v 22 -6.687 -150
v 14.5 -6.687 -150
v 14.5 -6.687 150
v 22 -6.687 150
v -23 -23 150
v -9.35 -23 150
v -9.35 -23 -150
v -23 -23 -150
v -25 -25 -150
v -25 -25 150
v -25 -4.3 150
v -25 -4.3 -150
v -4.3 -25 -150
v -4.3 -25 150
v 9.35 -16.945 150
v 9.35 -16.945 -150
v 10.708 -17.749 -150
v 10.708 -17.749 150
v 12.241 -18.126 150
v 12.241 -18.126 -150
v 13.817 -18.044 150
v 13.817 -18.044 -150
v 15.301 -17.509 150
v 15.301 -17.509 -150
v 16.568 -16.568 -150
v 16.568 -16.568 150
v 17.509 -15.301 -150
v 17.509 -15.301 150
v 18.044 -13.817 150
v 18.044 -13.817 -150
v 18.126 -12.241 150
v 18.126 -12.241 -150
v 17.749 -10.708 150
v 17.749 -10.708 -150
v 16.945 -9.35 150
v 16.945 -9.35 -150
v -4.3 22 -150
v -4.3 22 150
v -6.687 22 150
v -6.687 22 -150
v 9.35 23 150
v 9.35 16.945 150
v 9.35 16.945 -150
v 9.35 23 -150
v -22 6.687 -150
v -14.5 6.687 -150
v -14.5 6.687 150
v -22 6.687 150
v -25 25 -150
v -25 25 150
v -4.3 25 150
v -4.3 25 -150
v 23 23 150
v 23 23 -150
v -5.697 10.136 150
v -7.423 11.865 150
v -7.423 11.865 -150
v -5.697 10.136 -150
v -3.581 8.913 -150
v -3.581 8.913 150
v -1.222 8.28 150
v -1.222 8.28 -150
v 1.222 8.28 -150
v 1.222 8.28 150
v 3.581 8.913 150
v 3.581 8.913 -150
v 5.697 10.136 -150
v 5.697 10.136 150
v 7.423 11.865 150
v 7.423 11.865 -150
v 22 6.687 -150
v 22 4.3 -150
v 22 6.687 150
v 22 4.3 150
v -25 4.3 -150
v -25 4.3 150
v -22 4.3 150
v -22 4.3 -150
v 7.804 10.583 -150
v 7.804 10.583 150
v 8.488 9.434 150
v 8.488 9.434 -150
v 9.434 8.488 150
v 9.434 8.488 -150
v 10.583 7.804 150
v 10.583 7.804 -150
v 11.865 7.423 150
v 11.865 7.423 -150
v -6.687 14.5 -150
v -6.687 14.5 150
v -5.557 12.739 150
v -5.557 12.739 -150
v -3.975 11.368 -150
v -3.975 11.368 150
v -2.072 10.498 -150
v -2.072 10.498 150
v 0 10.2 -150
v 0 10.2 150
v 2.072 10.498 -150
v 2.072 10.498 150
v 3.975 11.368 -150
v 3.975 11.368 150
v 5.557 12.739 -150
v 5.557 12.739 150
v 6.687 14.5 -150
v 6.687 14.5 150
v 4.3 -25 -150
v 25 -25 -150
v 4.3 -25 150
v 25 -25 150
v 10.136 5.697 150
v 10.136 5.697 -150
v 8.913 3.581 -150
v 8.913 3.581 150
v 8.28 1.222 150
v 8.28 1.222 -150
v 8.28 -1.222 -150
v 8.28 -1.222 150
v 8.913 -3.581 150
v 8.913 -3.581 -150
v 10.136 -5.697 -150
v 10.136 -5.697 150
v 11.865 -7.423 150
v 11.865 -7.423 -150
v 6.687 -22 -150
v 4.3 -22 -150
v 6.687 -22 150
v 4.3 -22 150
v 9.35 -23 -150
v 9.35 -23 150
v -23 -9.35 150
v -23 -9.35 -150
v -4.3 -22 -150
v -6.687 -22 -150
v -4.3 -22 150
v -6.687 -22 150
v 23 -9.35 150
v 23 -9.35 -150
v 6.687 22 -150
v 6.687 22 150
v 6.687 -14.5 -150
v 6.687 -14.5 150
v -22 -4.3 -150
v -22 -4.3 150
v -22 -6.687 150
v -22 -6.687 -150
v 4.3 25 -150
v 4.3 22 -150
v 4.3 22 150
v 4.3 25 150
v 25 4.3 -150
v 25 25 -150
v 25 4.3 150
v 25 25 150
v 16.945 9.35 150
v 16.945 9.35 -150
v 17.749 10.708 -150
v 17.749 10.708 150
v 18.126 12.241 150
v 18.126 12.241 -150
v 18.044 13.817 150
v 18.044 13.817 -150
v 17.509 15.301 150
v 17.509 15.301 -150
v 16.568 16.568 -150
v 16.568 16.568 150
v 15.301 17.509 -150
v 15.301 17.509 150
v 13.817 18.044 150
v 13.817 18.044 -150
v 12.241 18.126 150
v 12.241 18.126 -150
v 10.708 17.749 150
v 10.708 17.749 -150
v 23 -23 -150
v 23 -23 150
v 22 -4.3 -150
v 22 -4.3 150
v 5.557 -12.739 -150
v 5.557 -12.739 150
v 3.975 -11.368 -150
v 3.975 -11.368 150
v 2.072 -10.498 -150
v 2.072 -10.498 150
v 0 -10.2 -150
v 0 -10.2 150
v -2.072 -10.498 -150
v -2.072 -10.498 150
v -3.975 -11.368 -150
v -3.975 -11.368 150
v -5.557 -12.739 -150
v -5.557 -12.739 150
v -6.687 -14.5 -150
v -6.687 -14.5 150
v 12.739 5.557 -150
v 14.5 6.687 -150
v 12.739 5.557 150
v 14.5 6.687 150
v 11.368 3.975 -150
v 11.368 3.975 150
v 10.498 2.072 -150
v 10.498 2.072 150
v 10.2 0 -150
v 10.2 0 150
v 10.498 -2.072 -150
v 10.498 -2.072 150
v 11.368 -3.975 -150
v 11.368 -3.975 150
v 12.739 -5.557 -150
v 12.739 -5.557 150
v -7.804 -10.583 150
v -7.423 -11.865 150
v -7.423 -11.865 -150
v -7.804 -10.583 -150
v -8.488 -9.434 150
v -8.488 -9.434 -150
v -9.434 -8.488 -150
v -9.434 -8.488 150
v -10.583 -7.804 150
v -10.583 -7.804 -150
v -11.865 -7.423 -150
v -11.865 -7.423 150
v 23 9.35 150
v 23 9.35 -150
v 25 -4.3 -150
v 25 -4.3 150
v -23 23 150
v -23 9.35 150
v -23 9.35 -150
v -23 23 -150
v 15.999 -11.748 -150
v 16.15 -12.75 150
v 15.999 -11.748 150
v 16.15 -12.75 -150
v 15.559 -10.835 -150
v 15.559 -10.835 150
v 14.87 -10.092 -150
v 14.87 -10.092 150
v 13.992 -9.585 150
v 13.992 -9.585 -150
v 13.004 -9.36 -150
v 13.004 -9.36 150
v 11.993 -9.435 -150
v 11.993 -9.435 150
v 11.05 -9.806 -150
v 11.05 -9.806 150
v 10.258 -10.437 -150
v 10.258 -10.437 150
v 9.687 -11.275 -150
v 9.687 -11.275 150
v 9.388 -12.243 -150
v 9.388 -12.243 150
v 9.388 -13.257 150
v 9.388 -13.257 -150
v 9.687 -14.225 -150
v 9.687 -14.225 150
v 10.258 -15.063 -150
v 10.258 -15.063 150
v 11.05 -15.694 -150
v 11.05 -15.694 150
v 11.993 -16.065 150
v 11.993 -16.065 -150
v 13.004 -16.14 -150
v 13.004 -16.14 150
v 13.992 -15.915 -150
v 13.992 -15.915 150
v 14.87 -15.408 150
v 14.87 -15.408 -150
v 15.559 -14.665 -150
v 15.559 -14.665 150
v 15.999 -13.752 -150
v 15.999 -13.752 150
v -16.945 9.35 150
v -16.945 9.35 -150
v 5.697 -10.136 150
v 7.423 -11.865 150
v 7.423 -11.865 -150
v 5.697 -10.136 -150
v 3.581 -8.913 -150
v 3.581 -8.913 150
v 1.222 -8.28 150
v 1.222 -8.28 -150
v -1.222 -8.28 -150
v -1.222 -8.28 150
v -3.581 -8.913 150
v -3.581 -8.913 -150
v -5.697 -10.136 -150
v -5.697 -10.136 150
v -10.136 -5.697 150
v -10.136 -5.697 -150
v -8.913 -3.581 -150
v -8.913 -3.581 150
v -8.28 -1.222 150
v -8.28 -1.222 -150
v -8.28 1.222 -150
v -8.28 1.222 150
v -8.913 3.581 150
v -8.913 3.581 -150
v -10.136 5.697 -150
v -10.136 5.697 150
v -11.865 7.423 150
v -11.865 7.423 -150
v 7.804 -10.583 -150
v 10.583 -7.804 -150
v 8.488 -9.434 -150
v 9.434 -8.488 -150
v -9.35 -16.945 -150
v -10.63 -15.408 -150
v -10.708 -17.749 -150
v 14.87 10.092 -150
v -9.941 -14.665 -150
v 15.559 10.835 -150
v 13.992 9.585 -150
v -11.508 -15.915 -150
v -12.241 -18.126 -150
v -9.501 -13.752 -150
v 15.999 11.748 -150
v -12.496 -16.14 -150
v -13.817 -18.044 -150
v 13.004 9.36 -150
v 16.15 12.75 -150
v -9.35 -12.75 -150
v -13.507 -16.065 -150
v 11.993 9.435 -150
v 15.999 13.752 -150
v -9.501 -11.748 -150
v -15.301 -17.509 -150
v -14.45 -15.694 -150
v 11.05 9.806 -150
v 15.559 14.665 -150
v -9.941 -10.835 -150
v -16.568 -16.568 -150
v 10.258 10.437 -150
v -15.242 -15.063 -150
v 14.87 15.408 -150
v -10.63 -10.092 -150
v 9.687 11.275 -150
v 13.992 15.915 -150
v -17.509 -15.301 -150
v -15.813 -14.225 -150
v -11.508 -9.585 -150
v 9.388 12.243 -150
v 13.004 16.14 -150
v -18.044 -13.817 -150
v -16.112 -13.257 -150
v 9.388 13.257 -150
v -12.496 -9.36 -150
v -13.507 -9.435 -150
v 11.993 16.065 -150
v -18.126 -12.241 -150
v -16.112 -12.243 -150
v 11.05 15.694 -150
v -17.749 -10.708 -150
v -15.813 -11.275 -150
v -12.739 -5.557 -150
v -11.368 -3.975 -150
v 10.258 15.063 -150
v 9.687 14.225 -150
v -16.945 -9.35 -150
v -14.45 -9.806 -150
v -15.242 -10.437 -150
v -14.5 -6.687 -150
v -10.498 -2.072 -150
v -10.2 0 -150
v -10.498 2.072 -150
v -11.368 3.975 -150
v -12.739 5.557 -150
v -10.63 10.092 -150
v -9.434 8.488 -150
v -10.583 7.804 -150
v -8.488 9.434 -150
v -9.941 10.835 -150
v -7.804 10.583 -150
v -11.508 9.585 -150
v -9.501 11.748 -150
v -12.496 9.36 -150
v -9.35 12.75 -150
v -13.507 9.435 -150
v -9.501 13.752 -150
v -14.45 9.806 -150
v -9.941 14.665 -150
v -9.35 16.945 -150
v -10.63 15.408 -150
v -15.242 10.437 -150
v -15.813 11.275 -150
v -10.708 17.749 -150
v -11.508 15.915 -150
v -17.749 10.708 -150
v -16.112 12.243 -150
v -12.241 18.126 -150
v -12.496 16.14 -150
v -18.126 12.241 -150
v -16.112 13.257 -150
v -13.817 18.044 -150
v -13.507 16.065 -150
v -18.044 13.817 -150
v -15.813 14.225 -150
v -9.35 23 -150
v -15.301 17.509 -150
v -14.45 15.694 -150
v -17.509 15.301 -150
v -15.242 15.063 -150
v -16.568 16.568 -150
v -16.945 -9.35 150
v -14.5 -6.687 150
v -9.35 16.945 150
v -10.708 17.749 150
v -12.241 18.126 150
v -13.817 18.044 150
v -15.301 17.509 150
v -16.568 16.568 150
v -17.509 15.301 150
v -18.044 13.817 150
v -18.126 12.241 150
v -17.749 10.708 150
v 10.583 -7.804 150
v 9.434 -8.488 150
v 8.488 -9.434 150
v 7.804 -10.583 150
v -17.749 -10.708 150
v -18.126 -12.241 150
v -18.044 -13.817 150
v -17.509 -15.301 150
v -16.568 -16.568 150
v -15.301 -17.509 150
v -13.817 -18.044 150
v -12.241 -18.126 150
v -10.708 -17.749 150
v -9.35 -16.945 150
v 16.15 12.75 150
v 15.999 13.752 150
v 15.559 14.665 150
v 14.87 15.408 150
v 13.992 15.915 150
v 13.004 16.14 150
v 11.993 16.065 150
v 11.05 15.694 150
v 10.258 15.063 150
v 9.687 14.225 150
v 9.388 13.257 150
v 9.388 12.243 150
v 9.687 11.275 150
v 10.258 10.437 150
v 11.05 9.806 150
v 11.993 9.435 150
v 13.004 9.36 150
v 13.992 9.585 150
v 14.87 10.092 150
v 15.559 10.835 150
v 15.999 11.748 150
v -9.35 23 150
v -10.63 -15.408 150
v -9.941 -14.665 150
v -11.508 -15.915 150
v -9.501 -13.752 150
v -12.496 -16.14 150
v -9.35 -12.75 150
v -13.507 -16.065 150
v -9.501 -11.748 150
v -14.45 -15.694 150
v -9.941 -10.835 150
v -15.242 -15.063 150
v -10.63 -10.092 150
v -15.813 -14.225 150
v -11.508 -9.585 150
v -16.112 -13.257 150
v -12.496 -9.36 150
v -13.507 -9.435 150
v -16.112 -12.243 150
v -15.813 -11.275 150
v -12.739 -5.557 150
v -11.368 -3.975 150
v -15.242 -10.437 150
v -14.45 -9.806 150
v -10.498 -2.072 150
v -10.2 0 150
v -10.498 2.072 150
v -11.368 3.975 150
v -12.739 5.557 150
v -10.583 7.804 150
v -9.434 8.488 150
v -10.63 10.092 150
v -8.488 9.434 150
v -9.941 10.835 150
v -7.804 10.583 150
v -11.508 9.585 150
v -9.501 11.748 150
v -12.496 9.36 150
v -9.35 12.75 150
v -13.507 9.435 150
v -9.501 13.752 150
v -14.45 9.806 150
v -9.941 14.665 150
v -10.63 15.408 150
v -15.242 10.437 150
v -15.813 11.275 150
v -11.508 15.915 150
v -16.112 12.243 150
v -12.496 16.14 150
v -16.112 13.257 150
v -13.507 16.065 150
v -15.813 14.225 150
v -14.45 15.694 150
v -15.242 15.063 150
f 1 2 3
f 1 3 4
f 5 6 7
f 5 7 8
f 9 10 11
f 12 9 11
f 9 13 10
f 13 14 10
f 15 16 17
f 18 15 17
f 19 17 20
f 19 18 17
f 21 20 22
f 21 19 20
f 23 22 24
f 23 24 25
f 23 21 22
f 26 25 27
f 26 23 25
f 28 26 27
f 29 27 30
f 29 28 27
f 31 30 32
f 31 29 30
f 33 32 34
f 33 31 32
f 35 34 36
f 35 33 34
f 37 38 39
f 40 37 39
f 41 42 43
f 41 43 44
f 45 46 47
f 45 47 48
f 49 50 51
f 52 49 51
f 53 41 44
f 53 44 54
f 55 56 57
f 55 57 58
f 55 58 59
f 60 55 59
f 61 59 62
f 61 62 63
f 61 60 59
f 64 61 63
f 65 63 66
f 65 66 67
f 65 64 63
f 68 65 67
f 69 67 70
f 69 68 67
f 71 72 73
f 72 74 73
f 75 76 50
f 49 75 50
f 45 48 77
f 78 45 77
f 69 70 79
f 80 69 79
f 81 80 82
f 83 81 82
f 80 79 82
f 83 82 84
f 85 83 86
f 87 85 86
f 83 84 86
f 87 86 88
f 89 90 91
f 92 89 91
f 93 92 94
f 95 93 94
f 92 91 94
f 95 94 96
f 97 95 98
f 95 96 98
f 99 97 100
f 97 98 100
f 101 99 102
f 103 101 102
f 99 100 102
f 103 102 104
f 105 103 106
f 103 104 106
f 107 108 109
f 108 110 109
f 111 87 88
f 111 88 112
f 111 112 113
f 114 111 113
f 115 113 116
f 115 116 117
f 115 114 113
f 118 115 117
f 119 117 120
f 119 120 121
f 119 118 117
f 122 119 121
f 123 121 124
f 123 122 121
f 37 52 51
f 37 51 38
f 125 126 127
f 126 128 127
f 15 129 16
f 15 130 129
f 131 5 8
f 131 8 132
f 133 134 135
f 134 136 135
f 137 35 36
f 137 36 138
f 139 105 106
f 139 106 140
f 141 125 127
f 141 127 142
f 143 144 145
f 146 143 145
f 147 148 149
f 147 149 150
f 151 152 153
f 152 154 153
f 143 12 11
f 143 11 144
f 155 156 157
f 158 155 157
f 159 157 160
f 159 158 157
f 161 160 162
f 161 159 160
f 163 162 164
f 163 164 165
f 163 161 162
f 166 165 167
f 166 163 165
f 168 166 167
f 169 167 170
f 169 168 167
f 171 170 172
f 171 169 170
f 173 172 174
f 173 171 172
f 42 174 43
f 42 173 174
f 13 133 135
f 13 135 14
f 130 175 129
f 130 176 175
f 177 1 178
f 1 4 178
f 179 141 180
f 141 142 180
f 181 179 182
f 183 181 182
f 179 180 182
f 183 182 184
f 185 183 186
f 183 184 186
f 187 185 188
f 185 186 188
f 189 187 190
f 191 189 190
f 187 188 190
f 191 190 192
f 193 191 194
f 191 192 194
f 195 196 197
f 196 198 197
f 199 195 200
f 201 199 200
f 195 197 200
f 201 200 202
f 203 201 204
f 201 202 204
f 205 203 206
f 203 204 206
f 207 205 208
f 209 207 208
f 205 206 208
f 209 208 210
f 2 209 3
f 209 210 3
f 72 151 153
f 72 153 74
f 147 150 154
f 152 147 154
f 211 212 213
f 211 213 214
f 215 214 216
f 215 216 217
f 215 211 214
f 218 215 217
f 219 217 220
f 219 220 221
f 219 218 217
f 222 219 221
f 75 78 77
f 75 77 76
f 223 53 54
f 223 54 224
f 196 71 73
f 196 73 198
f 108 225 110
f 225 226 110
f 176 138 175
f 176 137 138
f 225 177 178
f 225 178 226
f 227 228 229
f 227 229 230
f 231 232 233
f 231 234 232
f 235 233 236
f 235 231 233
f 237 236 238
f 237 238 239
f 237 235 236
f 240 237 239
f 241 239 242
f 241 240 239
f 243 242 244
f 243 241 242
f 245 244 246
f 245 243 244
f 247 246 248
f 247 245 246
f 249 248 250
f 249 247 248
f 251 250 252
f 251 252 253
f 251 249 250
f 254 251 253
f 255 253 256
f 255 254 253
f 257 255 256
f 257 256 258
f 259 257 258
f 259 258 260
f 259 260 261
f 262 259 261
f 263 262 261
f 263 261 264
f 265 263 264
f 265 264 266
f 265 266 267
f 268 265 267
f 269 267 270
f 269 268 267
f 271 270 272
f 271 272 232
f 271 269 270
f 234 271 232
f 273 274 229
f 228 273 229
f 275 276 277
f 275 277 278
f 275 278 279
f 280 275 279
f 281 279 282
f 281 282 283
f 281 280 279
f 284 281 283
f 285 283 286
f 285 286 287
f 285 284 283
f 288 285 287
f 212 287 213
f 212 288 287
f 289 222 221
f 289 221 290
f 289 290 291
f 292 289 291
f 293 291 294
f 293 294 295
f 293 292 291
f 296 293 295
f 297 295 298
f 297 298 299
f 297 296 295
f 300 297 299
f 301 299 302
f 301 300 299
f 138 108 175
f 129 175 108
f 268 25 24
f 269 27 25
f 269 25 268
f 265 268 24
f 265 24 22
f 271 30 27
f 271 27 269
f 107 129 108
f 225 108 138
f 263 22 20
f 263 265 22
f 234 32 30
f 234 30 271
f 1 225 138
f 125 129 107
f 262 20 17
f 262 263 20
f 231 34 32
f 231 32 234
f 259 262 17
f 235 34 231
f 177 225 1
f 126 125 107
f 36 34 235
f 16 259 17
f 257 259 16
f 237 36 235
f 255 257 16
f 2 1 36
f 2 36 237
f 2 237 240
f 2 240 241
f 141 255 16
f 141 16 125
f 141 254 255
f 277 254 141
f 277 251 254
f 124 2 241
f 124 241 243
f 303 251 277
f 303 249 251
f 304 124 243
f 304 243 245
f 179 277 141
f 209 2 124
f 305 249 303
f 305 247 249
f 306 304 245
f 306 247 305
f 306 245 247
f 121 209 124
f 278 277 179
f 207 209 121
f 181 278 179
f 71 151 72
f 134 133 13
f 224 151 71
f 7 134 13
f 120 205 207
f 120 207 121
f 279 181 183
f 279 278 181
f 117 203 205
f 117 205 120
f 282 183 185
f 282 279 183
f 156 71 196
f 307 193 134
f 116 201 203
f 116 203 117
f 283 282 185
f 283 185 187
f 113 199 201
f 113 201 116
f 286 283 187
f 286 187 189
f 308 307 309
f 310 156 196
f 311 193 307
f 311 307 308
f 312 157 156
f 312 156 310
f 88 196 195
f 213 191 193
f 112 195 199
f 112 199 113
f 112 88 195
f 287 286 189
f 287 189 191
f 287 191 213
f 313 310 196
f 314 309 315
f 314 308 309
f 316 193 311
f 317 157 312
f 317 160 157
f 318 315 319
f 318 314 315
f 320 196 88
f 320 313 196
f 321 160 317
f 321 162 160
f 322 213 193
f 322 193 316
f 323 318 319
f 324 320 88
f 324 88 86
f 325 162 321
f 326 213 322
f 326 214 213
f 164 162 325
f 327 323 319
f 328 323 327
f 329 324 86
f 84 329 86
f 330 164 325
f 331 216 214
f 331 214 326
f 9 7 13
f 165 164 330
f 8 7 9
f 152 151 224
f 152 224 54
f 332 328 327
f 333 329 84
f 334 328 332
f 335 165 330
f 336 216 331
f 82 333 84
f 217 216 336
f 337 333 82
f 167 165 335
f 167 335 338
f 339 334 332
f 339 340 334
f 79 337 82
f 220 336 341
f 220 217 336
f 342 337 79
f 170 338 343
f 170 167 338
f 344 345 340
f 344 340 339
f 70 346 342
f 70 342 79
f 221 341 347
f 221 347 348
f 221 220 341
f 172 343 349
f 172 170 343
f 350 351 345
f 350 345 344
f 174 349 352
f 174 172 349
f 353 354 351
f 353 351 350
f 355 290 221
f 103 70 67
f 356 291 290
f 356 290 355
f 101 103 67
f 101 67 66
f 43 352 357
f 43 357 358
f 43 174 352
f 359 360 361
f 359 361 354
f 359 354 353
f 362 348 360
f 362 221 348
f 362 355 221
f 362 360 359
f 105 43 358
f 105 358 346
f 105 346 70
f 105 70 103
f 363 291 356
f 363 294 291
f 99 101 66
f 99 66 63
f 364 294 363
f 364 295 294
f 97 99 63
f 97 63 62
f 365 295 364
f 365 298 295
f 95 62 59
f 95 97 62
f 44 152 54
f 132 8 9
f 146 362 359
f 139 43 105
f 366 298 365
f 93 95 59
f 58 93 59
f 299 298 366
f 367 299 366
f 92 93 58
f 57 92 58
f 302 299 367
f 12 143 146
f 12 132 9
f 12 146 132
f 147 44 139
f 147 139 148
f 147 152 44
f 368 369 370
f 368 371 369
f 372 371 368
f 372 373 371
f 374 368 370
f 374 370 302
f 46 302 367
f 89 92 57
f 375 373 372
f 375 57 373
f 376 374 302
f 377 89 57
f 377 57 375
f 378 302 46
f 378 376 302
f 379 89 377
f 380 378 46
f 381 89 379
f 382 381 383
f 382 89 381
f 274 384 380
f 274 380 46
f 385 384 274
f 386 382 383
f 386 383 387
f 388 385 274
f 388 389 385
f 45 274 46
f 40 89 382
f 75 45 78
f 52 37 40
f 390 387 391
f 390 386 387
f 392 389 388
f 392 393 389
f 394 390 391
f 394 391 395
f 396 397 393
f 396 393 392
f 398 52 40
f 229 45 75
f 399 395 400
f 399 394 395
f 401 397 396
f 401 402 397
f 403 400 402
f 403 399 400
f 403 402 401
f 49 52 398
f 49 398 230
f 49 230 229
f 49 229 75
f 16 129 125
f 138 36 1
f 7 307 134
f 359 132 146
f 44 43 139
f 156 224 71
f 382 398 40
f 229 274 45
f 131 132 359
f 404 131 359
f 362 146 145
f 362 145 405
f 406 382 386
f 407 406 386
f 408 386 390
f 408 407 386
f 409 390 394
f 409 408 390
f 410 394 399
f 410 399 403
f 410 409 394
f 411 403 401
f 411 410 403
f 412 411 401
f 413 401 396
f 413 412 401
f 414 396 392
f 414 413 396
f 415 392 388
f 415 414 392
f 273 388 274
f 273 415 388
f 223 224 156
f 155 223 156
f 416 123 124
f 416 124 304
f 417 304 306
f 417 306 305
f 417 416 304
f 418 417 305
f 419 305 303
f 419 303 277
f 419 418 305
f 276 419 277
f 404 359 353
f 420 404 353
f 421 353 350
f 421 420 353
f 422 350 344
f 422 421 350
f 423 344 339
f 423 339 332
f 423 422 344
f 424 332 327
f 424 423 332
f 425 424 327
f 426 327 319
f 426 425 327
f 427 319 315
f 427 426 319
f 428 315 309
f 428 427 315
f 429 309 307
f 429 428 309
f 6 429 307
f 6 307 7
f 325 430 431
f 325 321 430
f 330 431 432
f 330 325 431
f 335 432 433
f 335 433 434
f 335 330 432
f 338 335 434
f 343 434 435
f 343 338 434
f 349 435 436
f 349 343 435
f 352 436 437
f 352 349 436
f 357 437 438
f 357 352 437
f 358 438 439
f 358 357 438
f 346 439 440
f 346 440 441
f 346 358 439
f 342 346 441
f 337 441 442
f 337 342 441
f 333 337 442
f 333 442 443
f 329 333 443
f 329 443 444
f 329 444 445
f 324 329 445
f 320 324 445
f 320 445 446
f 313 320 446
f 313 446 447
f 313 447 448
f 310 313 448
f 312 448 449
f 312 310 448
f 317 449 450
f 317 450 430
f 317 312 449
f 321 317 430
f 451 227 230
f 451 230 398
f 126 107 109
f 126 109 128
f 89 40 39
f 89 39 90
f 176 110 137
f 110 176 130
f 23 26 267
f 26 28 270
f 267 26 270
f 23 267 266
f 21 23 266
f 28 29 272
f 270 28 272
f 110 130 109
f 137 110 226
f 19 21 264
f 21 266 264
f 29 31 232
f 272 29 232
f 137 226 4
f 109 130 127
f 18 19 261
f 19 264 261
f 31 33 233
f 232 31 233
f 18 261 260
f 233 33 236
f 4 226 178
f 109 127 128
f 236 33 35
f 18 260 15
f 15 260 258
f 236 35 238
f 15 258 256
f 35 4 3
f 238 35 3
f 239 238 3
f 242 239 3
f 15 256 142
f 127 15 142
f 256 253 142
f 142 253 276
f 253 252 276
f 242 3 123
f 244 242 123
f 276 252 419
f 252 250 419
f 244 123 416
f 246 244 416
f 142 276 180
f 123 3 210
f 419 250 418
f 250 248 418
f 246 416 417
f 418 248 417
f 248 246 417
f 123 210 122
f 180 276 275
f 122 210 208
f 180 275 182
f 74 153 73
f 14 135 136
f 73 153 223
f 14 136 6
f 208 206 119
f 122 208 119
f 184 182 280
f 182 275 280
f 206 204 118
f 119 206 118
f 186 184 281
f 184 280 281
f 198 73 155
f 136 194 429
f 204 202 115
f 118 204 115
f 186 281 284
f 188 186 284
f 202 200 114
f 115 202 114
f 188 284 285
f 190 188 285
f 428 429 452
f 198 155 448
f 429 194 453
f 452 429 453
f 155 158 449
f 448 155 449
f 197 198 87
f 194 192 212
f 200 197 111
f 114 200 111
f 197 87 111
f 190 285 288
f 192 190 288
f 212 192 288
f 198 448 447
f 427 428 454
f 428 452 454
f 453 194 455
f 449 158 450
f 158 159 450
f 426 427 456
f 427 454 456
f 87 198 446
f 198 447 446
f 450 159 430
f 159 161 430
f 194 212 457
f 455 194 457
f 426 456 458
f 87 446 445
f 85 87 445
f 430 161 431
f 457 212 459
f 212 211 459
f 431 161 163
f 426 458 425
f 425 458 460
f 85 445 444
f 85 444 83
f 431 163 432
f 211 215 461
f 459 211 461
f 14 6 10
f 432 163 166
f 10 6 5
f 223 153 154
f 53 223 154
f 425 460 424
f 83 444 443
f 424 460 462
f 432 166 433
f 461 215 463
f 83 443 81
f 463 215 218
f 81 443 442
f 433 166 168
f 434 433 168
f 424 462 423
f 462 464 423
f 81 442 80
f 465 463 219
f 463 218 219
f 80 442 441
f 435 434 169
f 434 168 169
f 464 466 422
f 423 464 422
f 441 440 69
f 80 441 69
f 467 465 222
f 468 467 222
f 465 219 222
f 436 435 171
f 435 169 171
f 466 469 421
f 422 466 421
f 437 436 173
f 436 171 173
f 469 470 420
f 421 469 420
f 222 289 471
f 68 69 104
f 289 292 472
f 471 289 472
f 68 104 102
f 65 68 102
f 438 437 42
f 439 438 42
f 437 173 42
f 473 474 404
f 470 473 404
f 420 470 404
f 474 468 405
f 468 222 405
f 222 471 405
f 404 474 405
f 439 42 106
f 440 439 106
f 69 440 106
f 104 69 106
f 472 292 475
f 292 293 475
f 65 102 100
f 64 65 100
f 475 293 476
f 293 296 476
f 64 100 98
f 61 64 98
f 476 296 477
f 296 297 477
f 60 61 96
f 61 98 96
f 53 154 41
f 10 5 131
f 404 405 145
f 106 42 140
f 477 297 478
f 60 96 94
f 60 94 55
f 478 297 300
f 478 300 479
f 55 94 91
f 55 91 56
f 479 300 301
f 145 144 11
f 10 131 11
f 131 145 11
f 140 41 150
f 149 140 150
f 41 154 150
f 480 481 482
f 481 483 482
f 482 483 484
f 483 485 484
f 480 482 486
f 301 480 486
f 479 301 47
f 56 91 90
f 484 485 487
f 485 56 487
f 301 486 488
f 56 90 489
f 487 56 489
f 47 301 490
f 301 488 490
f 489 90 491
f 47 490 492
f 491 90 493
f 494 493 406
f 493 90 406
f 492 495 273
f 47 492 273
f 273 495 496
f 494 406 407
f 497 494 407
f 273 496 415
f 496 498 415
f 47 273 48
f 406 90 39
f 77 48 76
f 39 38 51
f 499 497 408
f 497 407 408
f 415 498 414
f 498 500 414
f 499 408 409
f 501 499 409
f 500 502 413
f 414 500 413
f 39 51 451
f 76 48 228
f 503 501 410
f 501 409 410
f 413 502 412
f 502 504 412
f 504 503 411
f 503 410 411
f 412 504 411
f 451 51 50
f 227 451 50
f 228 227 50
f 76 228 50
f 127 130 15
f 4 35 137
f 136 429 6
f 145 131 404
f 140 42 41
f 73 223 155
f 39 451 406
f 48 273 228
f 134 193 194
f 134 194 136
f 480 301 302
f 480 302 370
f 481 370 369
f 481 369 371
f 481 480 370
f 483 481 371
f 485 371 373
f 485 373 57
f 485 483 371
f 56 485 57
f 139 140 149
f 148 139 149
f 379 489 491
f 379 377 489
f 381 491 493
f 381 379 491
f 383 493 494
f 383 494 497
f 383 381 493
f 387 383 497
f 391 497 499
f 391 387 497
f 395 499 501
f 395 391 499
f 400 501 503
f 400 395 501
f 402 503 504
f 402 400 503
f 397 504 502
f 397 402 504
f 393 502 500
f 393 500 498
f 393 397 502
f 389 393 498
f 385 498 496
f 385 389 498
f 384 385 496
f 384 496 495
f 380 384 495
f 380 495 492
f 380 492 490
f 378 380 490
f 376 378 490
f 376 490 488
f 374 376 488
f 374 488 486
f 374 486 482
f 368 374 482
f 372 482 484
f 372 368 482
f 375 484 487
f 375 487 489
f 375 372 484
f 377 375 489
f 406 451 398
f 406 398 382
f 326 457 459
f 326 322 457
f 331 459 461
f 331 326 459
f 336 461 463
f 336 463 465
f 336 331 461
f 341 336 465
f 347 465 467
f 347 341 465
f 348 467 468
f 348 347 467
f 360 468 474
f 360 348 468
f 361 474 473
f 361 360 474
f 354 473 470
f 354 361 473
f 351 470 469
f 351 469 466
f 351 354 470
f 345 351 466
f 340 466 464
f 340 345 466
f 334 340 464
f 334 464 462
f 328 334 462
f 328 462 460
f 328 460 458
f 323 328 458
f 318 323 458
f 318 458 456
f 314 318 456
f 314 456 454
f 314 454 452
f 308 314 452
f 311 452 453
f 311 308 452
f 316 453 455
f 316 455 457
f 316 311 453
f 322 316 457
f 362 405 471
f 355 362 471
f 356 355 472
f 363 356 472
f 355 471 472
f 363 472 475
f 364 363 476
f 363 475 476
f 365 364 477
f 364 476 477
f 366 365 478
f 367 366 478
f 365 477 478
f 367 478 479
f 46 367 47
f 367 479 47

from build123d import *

# Parameters (mm, degrees)
SKETCH_1_R         = 3.4
EXTRUDE_1267_DEPTH = 150


with BuildPart() as part:
    # 草圖1 → Extrude 1267 (new body, symmetric)
    with BuildSketch(Plane.XY):
        with BuildLine():
            Line((4.3, 25), (25, 25))
            Line((25, 25), (25, 4.3))
            Line((25, 4.3), (22, 4.3))
            Line((22, 4.3), (22, 6.687301399))
            Line((22, 6.687301399), (14.5, 6.687301399))
            ThreePointArc((14.5, 6.687301399), (10.2, 0), (14.5, -6.687301399))
            Line((14.5, -6.687301399), (22, -6.687301399))
            Line((22, -6.687301399), (22, -4.3))
            Line((22, -4.3), (25, -4.3))
            Line((25, -4.3), (25, -25))
            Line((25, -25), (4.3, -25))
            Line((4.3, -25), (4.3, -22))
            Line((4.3, -22), (6.687301399, -22))
            Line((6.687301399, -22), (6.687301399, -14.5))
            ThreePointArc((6.687301399, -14.5), (0, -10.2), (-6.687301399, -14.5))
            Line((-6.687301399, -14.5), (-6.687301399, -22))
            Line((-6.687301399, -22), (-4.3, -22))
            Line((-4.3, -22), (-4.3, -25))
            Line((-4.3, -25), (-25, -25))
            Line((-25, -25), (-25, -4.3))
            Line((-25, -4.3), (-22, -4.3))
            Line((-22, -4.3), (-22, -6.687301399))
            Line((-22, -6.687301399), (-14.5, -6.687301399))
            ThreePointArc((-14.5, -6.687301399), (-10.2, 0), (-14.5, 6.687301399))
            Line((-14.5, 6.687301399), (-22, 6.687301399))
            Line((-22, 6.687301399), (-22, 4.3))
            Line((-22, 4.3), (-25, 4.3))
            Line((-25, 4.3), (-25, 25))
            Line((-25, 25), (-4.3, 25))
            Line((-4.3, 25), (-4.3, 22))
            Line((-4.3, 22), (-6.687301399, 22))
            Line((-6.687301399, 22), (-6.687301399, 14.5))
            ThreePointArc((-6.687301399, 14.5), (0, 10.2), (6.687301399, 14.5))
            Line((6.687301399, 14.5), (6.687301399, 22))
            Line((6.687301399, 22), (4.3, 22))
            Line((4.3, 22), (4.3, 25))
        make_face()
        with Locations((12.75, 12.75)):
            Circle(SKETCH_1_R, mode=Mode.SUBTRACT)
        with Locations((12.75, -12.75)):
            Circle(SKETCH_1_R, mode=Mode.SUBTRACT)
        with Locations((-12.75, -12.75)):
            Circle(SKETCH_1_R, mode=Mode.SUBTRACT)
        with Locations((-12.75, 12.75)):
            Circle(SKETCH_1_R, mode=Mode.SUBTRACT)
        with BuildLine():
            Line((9.35, 23), (23, 23))
            Line((23, 23), (23, 9.35))
            Line((23, 9.35), (16.945235393, 9.35))
            ThreePointArc((16.945235393, 9.35), (16.568376618, 16.568376618), (9.35, 16.945235393))
            Line((9.35, 16.945235393), (9.35, 23))
        make_face(mode=Mode.SUBTRACT)
        with BuildLine():
            Line((9.35, -23), (9.35, -16.945235393))
            ThreePointArc((9.35, -16.945235393), (16.568376618, -16.568376618), (16.945235393, -9.35))
            Line((16.945235393, -9.35), (23, -9.35))
            Line((23, -9.35), (23, -23))
            Line((23, -23), (9.35, -23))
        make_face(mode=Mode.SUBTRACT)
        with BuildLine():
            Line((-9.35, -23), (-23, -23))
            Line((-23, -23), (-23, -9.35))
            Line((-23, -9.35), (-16.945235393, -9.35))
            ThreePointArc((-16.945235393, -9.35), (-16.568376618, -16.568376618), (-9.35, -16.945235393))
            Line((-9.35, -16.945235393), (-9.35, -23))
        make_face(mode=Mode.SUBTRACT)
        with BuildLine():
            Line((-9.35, 23), (-9.35, 16.945235393))
            ThreePointArc((-9.35, 16.945235393), (-16.568376618, 16.568376618), (-16.945235393, 9.35))
            Line((-16.945235393, 9.35), (-23, 9.35))
            Line((-23, 9.35), (-23, 23))
            Line((-23, 23), (-9.35, 23))
        make_face(mode=Mode.SUBTRACT)
        with BuildLine():
            ThreePointArc((11.864845961, 7.423040048), (8.2, 0), (11.864845961, -7.423040048))
            ThreePointArc((11.864845961, -7.423040048), (8.931623382, -8.931623382), (7.423040048, -11.864845961))
            ThreePointArc((7.423040048, -11.864845961), (0, -8.2), (-7.423040048, -11.864845961))
            ThreePointArc((-7.423040048, -11.864845961), (-8.931623382, -8.931623382), (-11.864845961, -7.423040048))
            ThreePointArc((-11.864845961, -7.423040048), (-8.2, 0), (-11.864845961, 7.423040048))
            ThreePointArc((-11.864845961, 7.423040048), (-8.931623382, 8.931623382), (-7.423040048, 11.864845961))
            ThreePointArc((-7.423040048, 11.864845961), (0, 8.2), (7.423040048, 11.864845961))
            ThreePointArc((7.423040048, 11.864845961), (8.931623382, 8.931623382), (11.864845961, 7.423040048))
        make_face(mode=Mode.SUBTRACT)
    extrude(amount=EXTRUDE_1267_DEPTH, both=True)


solid = part.part
